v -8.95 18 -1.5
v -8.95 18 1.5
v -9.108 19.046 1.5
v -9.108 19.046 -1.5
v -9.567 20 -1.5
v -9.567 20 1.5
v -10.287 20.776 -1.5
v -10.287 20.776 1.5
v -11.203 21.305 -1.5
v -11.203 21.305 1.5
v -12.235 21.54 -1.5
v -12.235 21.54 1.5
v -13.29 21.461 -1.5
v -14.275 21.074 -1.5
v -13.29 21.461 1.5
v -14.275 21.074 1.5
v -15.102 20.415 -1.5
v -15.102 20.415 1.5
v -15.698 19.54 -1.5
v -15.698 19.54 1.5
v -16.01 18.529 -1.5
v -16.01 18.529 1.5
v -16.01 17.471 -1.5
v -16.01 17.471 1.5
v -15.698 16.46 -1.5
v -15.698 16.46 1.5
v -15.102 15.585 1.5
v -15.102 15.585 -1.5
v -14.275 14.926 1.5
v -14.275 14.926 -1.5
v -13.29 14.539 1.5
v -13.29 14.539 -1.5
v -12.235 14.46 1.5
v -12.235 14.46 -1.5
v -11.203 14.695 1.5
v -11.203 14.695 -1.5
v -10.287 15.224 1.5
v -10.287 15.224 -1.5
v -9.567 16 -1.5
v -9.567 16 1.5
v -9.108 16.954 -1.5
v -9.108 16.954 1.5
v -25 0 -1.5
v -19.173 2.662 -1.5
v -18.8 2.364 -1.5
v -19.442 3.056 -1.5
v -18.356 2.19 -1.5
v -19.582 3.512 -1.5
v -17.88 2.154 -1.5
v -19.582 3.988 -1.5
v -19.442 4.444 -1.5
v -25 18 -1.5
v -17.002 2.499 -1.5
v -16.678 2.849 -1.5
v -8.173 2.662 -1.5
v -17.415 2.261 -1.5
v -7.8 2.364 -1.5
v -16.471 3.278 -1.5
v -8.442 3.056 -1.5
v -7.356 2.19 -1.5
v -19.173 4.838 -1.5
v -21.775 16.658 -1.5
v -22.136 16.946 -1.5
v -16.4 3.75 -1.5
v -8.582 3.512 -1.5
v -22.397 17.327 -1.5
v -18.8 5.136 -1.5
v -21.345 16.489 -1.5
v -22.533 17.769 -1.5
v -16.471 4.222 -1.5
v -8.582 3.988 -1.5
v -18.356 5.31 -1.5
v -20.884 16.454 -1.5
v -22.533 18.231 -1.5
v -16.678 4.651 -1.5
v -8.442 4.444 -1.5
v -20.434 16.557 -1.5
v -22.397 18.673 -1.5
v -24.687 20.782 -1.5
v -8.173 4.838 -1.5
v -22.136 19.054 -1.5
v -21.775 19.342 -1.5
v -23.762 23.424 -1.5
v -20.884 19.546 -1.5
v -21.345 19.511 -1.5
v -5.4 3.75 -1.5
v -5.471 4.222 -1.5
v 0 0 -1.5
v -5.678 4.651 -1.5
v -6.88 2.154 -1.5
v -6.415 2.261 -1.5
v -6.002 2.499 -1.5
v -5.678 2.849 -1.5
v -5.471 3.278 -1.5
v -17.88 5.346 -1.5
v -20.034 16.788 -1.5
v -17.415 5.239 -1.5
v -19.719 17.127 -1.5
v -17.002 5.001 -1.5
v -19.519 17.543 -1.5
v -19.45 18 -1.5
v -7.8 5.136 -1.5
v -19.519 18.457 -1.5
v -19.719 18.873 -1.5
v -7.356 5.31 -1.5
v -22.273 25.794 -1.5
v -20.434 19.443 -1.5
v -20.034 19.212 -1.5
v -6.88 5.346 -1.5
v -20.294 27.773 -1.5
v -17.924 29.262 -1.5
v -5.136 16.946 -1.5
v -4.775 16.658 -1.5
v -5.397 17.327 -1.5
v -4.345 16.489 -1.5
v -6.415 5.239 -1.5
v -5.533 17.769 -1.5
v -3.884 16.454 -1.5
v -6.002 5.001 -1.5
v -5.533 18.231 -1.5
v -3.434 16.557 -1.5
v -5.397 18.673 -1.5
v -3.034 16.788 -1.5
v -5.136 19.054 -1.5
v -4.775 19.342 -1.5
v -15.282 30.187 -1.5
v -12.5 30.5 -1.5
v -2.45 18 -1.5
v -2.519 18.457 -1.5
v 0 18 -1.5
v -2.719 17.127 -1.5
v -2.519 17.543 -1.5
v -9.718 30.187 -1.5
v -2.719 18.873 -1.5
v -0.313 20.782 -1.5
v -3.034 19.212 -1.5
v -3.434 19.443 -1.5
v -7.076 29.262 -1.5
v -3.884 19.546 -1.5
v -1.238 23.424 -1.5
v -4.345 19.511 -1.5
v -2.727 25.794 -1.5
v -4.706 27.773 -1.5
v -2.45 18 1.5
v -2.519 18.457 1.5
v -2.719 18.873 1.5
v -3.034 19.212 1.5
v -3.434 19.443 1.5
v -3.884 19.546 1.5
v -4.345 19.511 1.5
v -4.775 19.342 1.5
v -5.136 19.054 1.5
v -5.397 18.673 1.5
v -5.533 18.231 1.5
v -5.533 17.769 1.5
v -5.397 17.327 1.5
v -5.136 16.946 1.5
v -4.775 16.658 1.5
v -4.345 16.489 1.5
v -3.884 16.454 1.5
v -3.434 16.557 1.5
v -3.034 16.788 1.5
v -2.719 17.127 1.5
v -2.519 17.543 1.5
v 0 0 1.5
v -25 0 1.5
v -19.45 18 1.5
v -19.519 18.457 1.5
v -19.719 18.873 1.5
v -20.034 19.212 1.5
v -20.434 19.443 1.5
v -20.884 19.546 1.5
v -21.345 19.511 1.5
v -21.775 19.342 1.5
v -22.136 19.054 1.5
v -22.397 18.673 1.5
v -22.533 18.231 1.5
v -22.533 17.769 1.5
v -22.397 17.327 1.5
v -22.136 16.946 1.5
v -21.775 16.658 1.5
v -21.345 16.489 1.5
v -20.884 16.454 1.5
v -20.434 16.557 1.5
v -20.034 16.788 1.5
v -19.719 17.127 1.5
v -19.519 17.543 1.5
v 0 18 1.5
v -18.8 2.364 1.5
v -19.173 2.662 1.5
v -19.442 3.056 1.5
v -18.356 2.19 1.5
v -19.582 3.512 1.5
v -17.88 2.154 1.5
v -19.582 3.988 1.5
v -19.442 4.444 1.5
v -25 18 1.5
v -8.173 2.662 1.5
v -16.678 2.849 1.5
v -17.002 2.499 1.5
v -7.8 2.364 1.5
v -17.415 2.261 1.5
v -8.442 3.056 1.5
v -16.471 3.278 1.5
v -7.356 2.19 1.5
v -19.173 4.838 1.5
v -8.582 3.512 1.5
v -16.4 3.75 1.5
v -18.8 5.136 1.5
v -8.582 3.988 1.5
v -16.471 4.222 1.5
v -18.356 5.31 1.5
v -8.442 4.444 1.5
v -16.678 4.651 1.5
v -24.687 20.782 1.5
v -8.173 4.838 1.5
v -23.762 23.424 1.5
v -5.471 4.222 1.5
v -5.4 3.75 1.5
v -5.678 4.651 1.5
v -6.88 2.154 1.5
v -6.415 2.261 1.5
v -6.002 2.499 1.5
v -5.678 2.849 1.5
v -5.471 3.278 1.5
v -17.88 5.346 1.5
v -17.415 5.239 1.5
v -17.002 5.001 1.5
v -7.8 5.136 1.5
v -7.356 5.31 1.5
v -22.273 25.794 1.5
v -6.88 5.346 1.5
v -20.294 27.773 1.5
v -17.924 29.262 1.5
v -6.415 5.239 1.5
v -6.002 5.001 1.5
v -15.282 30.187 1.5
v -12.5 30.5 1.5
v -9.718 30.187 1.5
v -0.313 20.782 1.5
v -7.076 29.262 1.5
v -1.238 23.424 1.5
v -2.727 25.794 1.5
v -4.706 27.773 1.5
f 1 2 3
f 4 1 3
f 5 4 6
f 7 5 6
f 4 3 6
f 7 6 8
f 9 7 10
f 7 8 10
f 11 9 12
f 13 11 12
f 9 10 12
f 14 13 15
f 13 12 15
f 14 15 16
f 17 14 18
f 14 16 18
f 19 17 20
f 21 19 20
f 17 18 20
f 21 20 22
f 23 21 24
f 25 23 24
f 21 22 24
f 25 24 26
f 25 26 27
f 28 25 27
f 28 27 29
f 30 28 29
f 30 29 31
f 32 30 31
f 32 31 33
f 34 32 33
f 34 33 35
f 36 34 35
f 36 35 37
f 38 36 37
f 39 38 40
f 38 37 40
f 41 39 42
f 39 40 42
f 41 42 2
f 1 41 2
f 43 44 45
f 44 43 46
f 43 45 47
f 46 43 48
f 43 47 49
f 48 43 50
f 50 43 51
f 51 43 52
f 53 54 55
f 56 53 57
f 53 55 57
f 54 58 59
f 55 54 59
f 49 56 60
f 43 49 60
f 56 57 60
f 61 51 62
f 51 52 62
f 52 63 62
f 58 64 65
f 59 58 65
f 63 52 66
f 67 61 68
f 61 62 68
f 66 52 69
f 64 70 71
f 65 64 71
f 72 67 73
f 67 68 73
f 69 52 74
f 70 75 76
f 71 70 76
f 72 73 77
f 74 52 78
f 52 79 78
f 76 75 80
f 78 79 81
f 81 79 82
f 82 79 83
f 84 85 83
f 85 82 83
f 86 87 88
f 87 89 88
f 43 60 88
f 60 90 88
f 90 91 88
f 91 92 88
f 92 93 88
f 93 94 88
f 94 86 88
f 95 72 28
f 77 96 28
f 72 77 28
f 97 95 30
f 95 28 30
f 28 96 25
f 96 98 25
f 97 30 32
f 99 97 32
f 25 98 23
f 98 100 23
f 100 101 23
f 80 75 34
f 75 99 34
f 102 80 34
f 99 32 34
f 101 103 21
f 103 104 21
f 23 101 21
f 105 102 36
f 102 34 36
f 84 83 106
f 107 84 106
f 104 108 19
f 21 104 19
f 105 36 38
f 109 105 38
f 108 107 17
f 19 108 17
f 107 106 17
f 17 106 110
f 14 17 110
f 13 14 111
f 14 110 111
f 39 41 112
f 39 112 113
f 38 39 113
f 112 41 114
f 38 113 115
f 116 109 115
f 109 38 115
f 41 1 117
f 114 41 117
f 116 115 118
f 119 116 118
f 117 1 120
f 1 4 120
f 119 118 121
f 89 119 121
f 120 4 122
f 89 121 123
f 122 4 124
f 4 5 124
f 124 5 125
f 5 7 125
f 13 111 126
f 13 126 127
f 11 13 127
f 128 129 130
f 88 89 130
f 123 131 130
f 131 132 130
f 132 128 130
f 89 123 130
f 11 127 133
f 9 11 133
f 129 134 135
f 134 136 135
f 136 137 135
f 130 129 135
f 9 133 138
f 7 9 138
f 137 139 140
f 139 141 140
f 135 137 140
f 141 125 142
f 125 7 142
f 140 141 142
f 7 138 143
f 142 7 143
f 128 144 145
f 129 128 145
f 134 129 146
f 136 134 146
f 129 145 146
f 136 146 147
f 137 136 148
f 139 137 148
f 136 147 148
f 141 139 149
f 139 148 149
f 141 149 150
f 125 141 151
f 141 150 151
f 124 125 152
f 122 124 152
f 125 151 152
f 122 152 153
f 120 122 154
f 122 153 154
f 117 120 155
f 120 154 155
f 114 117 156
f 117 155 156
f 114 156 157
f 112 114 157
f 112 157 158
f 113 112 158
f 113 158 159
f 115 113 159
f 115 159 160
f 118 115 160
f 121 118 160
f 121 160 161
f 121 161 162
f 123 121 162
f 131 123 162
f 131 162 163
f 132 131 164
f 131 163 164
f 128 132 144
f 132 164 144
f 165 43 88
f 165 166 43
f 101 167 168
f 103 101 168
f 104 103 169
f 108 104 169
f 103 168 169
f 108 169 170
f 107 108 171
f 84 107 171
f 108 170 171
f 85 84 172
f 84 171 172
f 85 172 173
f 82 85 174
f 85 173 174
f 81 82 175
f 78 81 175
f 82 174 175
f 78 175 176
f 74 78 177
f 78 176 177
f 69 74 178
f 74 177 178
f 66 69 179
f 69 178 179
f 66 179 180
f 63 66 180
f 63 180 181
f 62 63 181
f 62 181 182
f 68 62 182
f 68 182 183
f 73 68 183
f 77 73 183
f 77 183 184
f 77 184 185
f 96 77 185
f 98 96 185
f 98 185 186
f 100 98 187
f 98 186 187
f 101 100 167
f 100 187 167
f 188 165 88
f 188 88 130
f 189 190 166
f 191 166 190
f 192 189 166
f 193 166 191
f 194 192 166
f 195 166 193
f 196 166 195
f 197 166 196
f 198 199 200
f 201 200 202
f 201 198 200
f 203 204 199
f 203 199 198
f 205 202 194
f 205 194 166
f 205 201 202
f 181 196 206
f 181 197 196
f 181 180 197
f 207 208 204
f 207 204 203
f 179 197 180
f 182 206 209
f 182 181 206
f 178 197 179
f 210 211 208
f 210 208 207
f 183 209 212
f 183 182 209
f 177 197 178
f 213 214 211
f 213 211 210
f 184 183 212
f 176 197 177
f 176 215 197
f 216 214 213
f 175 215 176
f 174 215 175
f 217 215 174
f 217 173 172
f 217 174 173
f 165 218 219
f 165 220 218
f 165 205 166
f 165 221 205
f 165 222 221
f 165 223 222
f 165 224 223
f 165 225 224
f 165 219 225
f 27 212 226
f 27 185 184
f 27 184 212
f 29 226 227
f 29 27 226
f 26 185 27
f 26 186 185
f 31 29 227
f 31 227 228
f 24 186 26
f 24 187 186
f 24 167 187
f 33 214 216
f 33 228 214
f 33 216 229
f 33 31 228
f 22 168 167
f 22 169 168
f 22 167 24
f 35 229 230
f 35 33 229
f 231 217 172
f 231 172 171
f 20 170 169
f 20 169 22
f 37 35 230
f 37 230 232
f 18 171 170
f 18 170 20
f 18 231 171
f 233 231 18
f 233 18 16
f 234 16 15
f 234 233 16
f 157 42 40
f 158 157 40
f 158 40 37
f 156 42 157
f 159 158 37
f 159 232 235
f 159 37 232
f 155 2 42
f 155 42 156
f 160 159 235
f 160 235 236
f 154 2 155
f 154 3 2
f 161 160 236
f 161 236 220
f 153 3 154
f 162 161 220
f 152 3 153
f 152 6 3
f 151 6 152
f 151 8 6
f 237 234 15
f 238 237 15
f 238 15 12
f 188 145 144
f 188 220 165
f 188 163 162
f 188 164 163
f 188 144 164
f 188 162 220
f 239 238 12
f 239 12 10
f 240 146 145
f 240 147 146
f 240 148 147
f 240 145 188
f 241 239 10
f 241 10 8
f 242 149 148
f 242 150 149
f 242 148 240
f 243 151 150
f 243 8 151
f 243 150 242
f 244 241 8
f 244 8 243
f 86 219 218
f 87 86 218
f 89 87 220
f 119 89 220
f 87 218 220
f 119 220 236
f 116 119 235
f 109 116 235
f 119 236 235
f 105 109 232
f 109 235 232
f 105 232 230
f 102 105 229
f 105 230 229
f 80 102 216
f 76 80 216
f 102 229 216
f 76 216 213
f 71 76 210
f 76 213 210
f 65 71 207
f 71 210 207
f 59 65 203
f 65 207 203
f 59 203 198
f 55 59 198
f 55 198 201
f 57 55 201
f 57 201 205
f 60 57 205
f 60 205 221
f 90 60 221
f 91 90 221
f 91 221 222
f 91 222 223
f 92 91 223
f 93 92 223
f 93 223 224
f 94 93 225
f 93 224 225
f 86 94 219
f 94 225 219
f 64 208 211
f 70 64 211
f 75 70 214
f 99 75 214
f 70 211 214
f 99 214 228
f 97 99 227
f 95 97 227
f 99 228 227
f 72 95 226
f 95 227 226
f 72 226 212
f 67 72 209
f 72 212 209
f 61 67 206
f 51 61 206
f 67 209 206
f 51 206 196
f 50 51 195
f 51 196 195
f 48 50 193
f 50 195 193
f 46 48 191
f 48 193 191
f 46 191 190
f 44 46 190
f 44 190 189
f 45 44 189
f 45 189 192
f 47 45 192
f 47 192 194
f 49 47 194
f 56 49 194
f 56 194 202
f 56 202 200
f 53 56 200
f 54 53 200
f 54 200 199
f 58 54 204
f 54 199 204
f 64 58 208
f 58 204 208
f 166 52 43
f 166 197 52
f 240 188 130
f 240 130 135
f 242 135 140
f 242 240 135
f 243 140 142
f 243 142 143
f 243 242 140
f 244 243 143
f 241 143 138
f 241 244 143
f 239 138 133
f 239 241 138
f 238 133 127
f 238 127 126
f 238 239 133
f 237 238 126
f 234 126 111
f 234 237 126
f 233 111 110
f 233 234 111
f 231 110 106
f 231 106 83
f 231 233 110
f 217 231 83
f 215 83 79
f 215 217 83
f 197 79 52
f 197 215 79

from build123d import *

# Parameters (mm, degrees)
EXTRUDE_1_DEPTH     = 1.5
SKETCH_2_R          = 1.6
CUT_EXTRUDE_1_DEPTH = 3
SKETCH_3_R          = 1.55
SKETCH_3_R_2        = 3.55
CUT_EXTRUDE_2_DEPTH = 3


with BuildPart() as part:
    # 草图1 → 凸台-拉伸1 (new, symmetric)
    with BuildSketch(Plane.XY):
        with BuildLine():
            Line((-25, 0), (0, 0))
            Line((0, 0), (0, 18))
            ThreePointArc((0, 18), (-12.5, 30.5), (-25, 18))
            Line((-25, 18), (-25, 0))
        make_face()
    extrude(amount=EXTRUDE_1_DEPTH, both=True)

    # 草图2 → 切除-拉伸1 (cut)
    with BuildSketch(Plane.XY.offset(1.5)):
        with Locations((-18, 3.75)):
            Circle(SKETCH_2_R)
        with Locations((-7, 3.75)):
            Circle(SKETCH_2_R)
    extrude(amount=-CUT_EXTRUDE_1_DEPTH, mode=Mode.SUBTRACT)

    # 草图3 → 切除-拉伸2 (cut)
    with BuildSketch(Plane.XY.offset(1.5)):
        with Locations((-4, 18)):
            Circle(SKETCH_3_R)
        with Locations((-21, 18)):
            Circle(SKETCH_3_R)
        with Locations((-12.5, 18)):
            Circle(SKETCH_3_R_2)
    extrude(amount=-CUT_EXTRUDE_2_DEPTH, mode=Mode.SUBTRACT)


solid = part.part
